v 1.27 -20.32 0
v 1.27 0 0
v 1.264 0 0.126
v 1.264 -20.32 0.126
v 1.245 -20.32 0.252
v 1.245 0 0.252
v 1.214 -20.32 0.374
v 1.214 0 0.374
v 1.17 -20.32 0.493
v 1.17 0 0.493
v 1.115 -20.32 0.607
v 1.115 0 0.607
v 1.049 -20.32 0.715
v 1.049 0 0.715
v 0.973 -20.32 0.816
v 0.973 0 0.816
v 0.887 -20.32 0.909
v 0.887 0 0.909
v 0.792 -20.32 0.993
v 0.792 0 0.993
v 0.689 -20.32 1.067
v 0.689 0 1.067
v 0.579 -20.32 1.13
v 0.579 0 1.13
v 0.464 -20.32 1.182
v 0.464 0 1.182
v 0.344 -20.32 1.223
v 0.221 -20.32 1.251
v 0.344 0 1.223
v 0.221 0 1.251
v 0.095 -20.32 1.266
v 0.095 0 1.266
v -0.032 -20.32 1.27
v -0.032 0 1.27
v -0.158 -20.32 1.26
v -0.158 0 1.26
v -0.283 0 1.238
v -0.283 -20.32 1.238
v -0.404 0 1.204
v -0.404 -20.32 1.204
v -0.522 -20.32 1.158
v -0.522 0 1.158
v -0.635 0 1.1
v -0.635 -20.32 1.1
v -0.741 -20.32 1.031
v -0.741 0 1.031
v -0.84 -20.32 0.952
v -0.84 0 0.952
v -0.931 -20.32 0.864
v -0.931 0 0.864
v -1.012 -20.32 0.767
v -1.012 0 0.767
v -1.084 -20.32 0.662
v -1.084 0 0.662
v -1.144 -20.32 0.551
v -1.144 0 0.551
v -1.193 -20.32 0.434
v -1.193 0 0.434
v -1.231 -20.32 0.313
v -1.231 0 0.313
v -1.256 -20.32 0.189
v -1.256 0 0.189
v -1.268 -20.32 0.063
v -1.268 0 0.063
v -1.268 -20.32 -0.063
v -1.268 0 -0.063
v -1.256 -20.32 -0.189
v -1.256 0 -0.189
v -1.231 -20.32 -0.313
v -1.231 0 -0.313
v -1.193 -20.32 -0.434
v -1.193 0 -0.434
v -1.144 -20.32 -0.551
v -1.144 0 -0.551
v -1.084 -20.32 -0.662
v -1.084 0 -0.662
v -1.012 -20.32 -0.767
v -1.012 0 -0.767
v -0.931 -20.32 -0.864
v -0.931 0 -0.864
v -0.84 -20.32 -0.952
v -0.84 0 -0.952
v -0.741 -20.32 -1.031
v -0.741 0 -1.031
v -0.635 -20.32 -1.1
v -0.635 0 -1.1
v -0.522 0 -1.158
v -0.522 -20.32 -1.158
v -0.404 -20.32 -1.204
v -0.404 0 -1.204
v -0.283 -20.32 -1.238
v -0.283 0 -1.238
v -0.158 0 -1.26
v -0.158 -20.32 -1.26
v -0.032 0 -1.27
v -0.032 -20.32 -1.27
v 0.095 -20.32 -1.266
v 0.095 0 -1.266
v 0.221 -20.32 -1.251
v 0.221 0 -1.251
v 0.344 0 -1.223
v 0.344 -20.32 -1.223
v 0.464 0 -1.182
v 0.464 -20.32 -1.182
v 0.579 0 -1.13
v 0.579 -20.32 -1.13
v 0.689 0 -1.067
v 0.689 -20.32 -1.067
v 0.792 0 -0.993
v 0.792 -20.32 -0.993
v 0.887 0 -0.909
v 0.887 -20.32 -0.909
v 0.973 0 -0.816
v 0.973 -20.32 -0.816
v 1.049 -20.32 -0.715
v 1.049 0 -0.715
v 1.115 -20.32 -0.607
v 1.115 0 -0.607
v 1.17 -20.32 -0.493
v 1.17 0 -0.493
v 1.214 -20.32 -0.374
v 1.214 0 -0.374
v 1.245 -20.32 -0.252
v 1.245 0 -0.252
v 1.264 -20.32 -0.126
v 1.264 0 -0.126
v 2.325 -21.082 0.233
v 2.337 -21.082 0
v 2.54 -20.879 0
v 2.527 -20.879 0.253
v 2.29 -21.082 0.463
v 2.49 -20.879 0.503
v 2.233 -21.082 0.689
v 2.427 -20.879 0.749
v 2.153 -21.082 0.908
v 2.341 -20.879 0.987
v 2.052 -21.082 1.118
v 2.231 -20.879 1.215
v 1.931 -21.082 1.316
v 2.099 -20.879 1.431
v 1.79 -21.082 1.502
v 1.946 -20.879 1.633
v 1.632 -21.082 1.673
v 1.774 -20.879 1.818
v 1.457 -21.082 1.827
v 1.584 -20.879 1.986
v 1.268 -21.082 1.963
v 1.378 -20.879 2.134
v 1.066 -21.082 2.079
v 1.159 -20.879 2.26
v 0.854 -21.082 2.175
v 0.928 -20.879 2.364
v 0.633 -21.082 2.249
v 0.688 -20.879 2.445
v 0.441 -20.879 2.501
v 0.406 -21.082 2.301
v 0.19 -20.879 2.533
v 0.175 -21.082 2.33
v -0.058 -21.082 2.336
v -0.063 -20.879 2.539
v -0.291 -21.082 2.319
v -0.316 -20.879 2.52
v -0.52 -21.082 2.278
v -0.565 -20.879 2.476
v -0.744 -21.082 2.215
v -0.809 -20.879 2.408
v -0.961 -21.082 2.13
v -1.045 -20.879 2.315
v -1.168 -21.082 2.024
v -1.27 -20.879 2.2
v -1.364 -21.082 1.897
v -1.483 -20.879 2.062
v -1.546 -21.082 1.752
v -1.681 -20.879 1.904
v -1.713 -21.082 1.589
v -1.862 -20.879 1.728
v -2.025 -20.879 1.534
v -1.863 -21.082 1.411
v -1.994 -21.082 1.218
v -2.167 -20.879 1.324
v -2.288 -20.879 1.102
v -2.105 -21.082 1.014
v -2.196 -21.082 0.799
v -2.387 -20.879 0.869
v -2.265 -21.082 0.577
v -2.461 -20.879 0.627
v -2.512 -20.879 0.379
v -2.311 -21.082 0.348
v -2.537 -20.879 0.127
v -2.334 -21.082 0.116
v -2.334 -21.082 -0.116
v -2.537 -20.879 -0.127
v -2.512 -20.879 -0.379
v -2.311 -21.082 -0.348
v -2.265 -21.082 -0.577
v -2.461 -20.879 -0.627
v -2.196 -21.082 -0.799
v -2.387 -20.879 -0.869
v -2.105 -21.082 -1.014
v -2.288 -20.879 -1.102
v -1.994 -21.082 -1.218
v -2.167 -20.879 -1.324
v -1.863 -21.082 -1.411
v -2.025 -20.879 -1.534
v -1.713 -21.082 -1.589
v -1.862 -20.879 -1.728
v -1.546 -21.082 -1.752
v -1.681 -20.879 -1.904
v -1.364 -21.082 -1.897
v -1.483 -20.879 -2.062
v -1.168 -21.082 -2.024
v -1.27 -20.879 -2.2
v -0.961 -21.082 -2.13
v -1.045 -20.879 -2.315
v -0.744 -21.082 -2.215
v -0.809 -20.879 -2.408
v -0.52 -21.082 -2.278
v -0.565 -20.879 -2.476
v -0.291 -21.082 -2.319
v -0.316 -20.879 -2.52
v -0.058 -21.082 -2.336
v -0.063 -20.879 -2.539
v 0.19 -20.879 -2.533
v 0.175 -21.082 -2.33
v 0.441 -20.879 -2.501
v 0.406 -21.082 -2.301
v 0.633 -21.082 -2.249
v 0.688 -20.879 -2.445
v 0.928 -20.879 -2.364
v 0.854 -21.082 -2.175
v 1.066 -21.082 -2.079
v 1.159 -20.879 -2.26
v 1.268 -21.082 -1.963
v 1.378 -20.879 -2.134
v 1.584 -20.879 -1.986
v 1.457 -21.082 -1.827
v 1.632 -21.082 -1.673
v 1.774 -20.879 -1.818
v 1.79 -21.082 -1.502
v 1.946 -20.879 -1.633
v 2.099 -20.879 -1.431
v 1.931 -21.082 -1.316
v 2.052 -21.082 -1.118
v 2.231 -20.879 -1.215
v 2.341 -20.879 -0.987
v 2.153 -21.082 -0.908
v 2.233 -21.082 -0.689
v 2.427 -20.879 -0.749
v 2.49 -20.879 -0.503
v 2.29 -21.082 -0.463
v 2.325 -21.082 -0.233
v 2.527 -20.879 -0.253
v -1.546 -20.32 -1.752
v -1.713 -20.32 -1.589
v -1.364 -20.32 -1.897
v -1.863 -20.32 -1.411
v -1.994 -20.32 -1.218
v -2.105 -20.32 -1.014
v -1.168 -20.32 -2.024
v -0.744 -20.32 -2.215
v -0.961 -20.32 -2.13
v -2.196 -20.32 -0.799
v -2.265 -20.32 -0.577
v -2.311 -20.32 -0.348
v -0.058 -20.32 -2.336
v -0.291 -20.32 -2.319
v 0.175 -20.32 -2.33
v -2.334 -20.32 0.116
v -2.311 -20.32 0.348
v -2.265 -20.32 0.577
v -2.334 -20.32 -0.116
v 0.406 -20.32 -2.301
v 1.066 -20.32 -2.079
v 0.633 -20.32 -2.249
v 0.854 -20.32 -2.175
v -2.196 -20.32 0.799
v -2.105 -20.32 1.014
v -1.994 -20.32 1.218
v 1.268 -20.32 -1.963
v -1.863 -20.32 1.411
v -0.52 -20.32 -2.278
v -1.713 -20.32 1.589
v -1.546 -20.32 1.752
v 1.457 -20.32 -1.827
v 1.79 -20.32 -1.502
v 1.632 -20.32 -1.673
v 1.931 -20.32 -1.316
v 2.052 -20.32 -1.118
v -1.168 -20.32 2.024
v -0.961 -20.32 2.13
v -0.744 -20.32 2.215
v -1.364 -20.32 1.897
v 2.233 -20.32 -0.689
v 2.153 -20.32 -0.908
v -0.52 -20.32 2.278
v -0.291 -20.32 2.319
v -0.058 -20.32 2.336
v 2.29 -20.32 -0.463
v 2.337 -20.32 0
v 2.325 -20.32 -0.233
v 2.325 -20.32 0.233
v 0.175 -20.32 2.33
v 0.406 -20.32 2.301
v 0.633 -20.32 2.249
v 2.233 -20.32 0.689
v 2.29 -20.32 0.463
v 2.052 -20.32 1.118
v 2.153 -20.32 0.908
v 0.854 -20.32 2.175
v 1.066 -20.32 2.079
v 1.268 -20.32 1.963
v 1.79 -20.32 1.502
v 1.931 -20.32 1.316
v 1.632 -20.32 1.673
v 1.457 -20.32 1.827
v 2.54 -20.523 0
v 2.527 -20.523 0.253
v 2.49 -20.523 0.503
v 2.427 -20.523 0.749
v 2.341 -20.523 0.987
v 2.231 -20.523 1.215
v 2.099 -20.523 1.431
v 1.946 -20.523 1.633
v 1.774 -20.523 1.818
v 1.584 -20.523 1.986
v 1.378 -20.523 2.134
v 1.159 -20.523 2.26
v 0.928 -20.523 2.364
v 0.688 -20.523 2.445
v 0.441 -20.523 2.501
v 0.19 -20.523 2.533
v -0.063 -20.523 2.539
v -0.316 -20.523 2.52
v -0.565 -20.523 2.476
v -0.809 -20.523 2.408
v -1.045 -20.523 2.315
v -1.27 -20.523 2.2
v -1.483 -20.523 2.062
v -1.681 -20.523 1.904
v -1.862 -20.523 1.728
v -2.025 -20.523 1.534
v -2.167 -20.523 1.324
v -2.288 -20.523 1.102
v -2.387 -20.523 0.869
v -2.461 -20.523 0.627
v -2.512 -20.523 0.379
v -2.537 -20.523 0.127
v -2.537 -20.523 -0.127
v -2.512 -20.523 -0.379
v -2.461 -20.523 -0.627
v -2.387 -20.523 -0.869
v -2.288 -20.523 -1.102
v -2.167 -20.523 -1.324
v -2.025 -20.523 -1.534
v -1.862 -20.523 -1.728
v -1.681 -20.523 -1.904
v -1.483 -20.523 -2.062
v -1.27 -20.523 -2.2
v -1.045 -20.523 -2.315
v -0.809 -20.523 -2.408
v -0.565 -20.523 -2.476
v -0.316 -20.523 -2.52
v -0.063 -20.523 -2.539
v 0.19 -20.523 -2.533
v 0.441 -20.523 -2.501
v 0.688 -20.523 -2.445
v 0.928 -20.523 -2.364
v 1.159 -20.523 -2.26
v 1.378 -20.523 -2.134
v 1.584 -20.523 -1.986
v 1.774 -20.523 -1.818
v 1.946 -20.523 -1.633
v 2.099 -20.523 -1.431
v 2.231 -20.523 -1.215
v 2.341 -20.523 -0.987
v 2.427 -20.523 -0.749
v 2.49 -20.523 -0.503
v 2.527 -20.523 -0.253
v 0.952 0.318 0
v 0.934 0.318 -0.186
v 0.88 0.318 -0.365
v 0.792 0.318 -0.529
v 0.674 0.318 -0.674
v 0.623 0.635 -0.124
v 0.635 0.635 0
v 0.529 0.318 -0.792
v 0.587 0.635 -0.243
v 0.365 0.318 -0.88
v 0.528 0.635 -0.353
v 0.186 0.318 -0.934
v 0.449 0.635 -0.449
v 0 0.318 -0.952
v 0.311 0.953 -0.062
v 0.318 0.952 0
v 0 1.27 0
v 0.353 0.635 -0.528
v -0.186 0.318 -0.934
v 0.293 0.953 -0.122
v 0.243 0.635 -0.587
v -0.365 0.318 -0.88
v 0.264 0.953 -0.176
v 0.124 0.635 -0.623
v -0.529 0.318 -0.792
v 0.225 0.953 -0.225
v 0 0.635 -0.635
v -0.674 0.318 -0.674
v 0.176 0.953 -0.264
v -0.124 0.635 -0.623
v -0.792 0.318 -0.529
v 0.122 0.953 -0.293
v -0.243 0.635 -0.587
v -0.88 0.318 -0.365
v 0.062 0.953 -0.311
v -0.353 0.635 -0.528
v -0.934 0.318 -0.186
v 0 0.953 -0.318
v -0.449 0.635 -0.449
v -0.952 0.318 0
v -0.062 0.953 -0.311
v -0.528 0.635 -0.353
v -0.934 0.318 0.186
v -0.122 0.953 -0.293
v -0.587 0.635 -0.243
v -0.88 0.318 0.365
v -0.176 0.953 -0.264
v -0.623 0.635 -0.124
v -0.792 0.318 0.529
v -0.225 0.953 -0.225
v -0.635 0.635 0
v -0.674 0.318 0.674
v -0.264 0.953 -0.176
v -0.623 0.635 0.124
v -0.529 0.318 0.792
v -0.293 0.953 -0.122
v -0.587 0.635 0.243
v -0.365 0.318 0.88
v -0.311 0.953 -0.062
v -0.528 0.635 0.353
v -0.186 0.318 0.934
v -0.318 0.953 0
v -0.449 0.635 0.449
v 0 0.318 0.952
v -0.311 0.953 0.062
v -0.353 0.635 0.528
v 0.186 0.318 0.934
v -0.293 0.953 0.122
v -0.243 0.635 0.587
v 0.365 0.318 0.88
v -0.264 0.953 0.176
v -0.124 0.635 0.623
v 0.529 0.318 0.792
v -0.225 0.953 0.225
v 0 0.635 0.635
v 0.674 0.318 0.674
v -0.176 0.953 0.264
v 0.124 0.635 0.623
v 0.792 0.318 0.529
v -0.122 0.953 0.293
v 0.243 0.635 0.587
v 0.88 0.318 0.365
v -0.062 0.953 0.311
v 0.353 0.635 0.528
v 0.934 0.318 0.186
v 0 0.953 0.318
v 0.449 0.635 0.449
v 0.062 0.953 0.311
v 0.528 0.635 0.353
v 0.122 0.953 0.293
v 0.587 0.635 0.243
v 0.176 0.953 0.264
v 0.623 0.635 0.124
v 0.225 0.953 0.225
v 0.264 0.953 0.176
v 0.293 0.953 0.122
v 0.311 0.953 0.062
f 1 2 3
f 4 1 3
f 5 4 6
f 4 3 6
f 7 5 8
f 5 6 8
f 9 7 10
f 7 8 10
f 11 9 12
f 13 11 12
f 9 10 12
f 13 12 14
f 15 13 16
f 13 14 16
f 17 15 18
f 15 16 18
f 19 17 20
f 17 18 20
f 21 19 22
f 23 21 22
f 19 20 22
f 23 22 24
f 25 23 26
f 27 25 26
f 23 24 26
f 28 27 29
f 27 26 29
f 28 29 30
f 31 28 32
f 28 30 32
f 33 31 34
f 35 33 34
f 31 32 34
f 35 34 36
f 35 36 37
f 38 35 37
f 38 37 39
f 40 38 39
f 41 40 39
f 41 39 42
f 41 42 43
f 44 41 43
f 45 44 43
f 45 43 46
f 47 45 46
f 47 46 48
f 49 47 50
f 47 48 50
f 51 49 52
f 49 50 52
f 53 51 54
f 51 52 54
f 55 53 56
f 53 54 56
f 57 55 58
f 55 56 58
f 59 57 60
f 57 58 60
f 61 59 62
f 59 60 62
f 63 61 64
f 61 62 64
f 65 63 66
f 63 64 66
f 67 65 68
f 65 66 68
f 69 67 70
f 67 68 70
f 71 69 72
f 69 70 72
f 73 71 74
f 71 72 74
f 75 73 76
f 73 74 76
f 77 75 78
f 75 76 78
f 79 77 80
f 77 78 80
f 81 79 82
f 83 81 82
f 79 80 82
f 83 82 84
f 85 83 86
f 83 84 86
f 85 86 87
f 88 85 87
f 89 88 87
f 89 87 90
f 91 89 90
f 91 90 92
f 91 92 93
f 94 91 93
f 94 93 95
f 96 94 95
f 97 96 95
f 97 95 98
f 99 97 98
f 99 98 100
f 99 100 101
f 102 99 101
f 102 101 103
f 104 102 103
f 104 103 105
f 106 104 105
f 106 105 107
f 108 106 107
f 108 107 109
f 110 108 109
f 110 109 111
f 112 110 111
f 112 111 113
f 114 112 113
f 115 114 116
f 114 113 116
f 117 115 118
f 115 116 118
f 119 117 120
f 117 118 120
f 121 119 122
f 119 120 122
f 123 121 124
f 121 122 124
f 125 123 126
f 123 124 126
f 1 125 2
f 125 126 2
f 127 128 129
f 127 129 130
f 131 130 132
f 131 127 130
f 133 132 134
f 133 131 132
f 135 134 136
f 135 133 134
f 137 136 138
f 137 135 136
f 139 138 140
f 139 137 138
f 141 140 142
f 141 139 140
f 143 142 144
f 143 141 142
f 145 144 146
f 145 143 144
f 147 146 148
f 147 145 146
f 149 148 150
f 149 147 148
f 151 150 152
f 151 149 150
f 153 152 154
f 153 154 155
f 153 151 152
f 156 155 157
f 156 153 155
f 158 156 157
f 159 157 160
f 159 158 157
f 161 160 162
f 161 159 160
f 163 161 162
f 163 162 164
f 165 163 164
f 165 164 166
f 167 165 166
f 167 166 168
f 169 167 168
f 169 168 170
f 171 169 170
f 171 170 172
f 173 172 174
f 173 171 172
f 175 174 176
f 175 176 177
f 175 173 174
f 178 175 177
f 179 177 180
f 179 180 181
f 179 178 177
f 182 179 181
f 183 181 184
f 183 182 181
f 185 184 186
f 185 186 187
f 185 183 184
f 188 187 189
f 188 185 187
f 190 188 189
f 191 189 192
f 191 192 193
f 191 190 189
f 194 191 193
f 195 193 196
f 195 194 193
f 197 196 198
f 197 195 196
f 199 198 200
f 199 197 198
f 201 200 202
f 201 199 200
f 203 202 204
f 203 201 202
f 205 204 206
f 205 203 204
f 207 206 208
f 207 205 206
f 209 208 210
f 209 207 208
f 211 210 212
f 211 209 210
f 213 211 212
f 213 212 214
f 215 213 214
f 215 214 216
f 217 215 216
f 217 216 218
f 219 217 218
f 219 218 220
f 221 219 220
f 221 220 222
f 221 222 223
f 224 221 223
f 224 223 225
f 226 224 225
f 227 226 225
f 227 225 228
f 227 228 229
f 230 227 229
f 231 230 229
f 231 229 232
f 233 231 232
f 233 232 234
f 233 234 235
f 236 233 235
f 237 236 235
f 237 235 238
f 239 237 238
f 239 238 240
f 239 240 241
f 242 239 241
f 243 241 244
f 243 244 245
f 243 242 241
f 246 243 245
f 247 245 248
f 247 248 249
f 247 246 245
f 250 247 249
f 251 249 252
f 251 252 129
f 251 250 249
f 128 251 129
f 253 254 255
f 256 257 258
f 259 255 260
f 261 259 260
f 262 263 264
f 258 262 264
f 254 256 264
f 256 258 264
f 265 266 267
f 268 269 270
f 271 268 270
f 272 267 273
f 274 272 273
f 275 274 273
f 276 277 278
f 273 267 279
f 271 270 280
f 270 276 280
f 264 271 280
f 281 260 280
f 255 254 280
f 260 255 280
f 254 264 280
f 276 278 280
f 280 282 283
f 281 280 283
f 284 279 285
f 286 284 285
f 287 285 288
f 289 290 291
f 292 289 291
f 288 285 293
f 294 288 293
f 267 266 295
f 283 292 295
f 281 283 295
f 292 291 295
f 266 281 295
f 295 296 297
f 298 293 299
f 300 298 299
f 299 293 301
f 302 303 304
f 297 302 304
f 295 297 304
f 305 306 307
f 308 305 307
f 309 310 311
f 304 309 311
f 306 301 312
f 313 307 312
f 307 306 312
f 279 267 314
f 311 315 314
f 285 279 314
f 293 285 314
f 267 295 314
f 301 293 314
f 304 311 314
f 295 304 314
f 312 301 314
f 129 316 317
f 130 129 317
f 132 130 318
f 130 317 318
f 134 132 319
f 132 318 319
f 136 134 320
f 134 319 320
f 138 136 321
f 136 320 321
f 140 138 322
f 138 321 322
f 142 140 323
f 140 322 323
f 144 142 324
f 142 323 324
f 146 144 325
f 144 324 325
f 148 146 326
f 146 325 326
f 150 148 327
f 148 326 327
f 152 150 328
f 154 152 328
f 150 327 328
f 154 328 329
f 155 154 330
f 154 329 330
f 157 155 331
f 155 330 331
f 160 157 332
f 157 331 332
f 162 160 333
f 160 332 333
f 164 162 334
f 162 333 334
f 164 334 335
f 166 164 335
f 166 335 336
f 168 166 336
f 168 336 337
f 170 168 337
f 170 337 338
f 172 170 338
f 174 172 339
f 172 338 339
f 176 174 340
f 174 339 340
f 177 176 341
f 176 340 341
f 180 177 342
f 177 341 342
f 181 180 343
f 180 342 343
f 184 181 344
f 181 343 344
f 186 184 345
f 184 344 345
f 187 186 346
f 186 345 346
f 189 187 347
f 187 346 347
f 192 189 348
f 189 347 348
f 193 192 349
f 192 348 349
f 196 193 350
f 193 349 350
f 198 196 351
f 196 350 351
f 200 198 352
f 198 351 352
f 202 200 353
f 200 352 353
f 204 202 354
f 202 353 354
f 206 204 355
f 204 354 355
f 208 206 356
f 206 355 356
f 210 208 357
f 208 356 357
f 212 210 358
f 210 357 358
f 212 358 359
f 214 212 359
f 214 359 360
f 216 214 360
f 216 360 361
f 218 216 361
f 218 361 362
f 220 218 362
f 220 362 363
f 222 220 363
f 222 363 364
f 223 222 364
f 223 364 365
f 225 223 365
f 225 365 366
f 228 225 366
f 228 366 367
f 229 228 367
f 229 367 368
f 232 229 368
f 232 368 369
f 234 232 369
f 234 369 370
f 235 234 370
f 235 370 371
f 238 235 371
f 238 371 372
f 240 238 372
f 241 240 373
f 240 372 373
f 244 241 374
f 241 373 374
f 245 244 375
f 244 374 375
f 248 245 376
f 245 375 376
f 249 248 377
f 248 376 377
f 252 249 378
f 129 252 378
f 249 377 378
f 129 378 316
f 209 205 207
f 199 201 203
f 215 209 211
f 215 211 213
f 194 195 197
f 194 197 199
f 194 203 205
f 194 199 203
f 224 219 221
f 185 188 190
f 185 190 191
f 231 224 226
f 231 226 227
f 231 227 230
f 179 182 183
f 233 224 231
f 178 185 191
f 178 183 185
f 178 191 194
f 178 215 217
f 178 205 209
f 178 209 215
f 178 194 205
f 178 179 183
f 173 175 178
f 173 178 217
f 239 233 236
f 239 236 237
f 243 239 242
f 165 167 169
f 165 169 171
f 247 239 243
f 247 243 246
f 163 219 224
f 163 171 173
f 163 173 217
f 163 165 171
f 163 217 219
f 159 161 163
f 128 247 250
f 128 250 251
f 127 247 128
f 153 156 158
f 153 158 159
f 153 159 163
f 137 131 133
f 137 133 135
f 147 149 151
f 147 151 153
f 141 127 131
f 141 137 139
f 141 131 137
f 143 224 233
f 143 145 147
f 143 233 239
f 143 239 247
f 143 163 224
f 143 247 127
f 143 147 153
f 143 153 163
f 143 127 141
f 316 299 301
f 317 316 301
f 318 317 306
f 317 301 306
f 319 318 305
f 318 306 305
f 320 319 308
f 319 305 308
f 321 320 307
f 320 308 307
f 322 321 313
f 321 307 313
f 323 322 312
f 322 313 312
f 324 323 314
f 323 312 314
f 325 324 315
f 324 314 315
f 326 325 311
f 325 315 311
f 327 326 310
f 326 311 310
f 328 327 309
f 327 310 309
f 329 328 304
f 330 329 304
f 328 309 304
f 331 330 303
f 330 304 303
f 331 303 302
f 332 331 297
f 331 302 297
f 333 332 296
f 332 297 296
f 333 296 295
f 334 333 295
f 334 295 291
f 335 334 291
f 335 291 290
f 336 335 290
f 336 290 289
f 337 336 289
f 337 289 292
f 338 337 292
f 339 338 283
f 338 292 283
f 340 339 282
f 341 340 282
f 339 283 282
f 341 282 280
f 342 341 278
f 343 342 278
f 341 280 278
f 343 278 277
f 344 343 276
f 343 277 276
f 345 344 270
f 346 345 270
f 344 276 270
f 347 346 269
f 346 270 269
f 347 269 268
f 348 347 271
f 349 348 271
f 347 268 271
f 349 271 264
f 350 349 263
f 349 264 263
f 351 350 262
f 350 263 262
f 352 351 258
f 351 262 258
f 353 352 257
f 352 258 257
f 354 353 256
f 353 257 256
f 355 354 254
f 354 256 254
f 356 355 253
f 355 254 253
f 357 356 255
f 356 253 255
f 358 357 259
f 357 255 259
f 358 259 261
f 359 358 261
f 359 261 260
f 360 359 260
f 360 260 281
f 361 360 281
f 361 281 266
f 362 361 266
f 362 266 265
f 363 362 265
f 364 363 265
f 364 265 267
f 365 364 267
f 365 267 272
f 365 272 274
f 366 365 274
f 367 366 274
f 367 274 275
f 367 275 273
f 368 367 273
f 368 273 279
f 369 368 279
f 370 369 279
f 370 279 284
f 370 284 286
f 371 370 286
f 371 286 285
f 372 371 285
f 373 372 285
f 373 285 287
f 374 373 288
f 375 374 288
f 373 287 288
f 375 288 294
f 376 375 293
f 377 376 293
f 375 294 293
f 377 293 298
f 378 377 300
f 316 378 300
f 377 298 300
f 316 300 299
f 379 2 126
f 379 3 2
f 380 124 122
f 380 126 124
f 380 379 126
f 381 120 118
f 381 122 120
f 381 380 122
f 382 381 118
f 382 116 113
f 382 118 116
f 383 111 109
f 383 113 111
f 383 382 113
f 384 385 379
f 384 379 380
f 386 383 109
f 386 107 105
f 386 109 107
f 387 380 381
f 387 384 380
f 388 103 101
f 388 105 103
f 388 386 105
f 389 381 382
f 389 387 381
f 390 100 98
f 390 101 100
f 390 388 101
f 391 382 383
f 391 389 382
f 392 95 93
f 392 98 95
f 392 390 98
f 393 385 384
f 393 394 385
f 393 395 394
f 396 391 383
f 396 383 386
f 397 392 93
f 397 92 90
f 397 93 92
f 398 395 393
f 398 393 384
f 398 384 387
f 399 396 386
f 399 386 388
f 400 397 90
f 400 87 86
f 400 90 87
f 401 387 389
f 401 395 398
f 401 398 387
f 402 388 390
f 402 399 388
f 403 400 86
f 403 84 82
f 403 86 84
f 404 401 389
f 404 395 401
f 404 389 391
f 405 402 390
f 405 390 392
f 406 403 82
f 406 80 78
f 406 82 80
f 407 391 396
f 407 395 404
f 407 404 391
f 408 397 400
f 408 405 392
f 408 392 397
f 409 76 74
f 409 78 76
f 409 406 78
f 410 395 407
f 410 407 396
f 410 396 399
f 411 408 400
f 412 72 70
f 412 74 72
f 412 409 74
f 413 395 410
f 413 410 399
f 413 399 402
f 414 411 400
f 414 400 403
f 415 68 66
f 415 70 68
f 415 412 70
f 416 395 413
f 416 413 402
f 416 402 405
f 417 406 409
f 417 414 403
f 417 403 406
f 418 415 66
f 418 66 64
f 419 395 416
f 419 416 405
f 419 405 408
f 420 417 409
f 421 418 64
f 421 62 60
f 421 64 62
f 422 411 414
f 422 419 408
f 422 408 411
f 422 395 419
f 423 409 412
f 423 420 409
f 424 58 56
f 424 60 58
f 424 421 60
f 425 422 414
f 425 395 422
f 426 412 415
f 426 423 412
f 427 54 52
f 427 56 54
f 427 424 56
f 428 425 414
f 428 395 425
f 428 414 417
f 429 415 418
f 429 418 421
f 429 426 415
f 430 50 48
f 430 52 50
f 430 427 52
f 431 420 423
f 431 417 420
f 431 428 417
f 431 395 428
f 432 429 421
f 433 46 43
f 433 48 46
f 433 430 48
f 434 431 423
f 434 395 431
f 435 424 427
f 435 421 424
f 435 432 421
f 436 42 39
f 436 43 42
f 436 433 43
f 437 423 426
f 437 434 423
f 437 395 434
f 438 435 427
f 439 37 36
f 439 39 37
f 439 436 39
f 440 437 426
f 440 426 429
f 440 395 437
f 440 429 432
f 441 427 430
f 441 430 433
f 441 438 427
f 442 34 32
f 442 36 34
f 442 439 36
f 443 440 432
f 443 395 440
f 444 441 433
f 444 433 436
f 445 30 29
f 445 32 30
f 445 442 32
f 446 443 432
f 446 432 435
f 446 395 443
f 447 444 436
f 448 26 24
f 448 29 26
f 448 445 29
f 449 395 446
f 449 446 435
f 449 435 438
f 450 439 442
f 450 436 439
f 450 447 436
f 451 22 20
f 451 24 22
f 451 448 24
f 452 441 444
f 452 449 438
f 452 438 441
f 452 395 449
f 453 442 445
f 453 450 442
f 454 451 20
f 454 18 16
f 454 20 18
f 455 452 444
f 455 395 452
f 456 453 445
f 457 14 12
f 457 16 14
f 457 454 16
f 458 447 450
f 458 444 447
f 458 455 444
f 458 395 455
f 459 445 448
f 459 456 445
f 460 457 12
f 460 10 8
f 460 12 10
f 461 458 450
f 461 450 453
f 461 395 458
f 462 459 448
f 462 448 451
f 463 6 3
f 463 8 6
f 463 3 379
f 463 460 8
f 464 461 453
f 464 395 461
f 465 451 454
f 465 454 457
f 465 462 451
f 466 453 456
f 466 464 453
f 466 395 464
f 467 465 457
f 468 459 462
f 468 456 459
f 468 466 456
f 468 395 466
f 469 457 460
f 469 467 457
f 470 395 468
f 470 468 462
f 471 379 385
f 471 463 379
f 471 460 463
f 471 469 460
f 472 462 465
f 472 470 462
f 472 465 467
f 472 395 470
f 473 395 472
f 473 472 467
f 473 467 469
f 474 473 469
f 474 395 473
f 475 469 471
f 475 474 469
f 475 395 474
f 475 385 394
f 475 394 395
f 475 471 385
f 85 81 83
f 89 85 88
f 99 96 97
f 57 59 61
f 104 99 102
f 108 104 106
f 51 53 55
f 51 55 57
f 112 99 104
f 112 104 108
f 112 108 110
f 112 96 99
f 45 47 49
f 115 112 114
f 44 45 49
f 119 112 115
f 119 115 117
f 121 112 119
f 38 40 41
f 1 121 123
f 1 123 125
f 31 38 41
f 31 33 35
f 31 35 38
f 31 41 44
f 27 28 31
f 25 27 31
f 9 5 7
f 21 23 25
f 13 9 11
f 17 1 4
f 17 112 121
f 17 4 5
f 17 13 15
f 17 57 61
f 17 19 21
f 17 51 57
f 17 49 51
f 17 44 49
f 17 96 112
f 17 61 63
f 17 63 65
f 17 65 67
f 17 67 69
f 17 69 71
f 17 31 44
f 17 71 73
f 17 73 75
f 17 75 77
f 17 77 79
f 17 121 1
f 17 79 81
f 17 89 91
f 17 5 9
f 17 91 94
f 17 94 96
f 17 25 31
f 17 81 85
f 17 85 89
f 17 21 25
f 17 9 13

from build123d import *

# Parameters (mm, degrees)
F0_R     = 1.27
F1_DEPTH = 20.32
F2_R     = 2.54
F2_R_2   = 1.27
F3_DEPTH = 0.762
F4_SIZE  = 0.2032


with BuildPart() as f1:
    # F0 (on Front) → F1 (new body)
    with BuildSketch(Plane.XZ):
        Circle(F0_R)
    extrude(amount=F1_DEPTH)

    # F5 (on Top) → F6 (revolve)
    with BuildSketch(Plane.XY):
        Polygon((0, 1.27), (0, 0), (1.27, 0), align=None)
    revolve(axis=Axis((0, 0.635, 0), (0, 1, 0)))


with BuildPart() as f3:
    # F2 (on face) → F3 (new body)
    with BuildSketch(Plane.XZ.offset(20.32)):
        Circle(F2_R)
        Circle(F2_R_2, mode=Mode.SUBTRACT)
        Circle(F2_R_2)
    extrude(amount=F3_DEPTH)

    # F4
    f4_edges = [f3.edges().sort_by_distance(p)[0] for p in [
        (-2.54, -21.082, 0),
        (-2.54, -20.32, 0),
    ]]
    chamfer(f4_edges, length=F4_SIZE)


solid = Compound([f1.part, f3.part])
